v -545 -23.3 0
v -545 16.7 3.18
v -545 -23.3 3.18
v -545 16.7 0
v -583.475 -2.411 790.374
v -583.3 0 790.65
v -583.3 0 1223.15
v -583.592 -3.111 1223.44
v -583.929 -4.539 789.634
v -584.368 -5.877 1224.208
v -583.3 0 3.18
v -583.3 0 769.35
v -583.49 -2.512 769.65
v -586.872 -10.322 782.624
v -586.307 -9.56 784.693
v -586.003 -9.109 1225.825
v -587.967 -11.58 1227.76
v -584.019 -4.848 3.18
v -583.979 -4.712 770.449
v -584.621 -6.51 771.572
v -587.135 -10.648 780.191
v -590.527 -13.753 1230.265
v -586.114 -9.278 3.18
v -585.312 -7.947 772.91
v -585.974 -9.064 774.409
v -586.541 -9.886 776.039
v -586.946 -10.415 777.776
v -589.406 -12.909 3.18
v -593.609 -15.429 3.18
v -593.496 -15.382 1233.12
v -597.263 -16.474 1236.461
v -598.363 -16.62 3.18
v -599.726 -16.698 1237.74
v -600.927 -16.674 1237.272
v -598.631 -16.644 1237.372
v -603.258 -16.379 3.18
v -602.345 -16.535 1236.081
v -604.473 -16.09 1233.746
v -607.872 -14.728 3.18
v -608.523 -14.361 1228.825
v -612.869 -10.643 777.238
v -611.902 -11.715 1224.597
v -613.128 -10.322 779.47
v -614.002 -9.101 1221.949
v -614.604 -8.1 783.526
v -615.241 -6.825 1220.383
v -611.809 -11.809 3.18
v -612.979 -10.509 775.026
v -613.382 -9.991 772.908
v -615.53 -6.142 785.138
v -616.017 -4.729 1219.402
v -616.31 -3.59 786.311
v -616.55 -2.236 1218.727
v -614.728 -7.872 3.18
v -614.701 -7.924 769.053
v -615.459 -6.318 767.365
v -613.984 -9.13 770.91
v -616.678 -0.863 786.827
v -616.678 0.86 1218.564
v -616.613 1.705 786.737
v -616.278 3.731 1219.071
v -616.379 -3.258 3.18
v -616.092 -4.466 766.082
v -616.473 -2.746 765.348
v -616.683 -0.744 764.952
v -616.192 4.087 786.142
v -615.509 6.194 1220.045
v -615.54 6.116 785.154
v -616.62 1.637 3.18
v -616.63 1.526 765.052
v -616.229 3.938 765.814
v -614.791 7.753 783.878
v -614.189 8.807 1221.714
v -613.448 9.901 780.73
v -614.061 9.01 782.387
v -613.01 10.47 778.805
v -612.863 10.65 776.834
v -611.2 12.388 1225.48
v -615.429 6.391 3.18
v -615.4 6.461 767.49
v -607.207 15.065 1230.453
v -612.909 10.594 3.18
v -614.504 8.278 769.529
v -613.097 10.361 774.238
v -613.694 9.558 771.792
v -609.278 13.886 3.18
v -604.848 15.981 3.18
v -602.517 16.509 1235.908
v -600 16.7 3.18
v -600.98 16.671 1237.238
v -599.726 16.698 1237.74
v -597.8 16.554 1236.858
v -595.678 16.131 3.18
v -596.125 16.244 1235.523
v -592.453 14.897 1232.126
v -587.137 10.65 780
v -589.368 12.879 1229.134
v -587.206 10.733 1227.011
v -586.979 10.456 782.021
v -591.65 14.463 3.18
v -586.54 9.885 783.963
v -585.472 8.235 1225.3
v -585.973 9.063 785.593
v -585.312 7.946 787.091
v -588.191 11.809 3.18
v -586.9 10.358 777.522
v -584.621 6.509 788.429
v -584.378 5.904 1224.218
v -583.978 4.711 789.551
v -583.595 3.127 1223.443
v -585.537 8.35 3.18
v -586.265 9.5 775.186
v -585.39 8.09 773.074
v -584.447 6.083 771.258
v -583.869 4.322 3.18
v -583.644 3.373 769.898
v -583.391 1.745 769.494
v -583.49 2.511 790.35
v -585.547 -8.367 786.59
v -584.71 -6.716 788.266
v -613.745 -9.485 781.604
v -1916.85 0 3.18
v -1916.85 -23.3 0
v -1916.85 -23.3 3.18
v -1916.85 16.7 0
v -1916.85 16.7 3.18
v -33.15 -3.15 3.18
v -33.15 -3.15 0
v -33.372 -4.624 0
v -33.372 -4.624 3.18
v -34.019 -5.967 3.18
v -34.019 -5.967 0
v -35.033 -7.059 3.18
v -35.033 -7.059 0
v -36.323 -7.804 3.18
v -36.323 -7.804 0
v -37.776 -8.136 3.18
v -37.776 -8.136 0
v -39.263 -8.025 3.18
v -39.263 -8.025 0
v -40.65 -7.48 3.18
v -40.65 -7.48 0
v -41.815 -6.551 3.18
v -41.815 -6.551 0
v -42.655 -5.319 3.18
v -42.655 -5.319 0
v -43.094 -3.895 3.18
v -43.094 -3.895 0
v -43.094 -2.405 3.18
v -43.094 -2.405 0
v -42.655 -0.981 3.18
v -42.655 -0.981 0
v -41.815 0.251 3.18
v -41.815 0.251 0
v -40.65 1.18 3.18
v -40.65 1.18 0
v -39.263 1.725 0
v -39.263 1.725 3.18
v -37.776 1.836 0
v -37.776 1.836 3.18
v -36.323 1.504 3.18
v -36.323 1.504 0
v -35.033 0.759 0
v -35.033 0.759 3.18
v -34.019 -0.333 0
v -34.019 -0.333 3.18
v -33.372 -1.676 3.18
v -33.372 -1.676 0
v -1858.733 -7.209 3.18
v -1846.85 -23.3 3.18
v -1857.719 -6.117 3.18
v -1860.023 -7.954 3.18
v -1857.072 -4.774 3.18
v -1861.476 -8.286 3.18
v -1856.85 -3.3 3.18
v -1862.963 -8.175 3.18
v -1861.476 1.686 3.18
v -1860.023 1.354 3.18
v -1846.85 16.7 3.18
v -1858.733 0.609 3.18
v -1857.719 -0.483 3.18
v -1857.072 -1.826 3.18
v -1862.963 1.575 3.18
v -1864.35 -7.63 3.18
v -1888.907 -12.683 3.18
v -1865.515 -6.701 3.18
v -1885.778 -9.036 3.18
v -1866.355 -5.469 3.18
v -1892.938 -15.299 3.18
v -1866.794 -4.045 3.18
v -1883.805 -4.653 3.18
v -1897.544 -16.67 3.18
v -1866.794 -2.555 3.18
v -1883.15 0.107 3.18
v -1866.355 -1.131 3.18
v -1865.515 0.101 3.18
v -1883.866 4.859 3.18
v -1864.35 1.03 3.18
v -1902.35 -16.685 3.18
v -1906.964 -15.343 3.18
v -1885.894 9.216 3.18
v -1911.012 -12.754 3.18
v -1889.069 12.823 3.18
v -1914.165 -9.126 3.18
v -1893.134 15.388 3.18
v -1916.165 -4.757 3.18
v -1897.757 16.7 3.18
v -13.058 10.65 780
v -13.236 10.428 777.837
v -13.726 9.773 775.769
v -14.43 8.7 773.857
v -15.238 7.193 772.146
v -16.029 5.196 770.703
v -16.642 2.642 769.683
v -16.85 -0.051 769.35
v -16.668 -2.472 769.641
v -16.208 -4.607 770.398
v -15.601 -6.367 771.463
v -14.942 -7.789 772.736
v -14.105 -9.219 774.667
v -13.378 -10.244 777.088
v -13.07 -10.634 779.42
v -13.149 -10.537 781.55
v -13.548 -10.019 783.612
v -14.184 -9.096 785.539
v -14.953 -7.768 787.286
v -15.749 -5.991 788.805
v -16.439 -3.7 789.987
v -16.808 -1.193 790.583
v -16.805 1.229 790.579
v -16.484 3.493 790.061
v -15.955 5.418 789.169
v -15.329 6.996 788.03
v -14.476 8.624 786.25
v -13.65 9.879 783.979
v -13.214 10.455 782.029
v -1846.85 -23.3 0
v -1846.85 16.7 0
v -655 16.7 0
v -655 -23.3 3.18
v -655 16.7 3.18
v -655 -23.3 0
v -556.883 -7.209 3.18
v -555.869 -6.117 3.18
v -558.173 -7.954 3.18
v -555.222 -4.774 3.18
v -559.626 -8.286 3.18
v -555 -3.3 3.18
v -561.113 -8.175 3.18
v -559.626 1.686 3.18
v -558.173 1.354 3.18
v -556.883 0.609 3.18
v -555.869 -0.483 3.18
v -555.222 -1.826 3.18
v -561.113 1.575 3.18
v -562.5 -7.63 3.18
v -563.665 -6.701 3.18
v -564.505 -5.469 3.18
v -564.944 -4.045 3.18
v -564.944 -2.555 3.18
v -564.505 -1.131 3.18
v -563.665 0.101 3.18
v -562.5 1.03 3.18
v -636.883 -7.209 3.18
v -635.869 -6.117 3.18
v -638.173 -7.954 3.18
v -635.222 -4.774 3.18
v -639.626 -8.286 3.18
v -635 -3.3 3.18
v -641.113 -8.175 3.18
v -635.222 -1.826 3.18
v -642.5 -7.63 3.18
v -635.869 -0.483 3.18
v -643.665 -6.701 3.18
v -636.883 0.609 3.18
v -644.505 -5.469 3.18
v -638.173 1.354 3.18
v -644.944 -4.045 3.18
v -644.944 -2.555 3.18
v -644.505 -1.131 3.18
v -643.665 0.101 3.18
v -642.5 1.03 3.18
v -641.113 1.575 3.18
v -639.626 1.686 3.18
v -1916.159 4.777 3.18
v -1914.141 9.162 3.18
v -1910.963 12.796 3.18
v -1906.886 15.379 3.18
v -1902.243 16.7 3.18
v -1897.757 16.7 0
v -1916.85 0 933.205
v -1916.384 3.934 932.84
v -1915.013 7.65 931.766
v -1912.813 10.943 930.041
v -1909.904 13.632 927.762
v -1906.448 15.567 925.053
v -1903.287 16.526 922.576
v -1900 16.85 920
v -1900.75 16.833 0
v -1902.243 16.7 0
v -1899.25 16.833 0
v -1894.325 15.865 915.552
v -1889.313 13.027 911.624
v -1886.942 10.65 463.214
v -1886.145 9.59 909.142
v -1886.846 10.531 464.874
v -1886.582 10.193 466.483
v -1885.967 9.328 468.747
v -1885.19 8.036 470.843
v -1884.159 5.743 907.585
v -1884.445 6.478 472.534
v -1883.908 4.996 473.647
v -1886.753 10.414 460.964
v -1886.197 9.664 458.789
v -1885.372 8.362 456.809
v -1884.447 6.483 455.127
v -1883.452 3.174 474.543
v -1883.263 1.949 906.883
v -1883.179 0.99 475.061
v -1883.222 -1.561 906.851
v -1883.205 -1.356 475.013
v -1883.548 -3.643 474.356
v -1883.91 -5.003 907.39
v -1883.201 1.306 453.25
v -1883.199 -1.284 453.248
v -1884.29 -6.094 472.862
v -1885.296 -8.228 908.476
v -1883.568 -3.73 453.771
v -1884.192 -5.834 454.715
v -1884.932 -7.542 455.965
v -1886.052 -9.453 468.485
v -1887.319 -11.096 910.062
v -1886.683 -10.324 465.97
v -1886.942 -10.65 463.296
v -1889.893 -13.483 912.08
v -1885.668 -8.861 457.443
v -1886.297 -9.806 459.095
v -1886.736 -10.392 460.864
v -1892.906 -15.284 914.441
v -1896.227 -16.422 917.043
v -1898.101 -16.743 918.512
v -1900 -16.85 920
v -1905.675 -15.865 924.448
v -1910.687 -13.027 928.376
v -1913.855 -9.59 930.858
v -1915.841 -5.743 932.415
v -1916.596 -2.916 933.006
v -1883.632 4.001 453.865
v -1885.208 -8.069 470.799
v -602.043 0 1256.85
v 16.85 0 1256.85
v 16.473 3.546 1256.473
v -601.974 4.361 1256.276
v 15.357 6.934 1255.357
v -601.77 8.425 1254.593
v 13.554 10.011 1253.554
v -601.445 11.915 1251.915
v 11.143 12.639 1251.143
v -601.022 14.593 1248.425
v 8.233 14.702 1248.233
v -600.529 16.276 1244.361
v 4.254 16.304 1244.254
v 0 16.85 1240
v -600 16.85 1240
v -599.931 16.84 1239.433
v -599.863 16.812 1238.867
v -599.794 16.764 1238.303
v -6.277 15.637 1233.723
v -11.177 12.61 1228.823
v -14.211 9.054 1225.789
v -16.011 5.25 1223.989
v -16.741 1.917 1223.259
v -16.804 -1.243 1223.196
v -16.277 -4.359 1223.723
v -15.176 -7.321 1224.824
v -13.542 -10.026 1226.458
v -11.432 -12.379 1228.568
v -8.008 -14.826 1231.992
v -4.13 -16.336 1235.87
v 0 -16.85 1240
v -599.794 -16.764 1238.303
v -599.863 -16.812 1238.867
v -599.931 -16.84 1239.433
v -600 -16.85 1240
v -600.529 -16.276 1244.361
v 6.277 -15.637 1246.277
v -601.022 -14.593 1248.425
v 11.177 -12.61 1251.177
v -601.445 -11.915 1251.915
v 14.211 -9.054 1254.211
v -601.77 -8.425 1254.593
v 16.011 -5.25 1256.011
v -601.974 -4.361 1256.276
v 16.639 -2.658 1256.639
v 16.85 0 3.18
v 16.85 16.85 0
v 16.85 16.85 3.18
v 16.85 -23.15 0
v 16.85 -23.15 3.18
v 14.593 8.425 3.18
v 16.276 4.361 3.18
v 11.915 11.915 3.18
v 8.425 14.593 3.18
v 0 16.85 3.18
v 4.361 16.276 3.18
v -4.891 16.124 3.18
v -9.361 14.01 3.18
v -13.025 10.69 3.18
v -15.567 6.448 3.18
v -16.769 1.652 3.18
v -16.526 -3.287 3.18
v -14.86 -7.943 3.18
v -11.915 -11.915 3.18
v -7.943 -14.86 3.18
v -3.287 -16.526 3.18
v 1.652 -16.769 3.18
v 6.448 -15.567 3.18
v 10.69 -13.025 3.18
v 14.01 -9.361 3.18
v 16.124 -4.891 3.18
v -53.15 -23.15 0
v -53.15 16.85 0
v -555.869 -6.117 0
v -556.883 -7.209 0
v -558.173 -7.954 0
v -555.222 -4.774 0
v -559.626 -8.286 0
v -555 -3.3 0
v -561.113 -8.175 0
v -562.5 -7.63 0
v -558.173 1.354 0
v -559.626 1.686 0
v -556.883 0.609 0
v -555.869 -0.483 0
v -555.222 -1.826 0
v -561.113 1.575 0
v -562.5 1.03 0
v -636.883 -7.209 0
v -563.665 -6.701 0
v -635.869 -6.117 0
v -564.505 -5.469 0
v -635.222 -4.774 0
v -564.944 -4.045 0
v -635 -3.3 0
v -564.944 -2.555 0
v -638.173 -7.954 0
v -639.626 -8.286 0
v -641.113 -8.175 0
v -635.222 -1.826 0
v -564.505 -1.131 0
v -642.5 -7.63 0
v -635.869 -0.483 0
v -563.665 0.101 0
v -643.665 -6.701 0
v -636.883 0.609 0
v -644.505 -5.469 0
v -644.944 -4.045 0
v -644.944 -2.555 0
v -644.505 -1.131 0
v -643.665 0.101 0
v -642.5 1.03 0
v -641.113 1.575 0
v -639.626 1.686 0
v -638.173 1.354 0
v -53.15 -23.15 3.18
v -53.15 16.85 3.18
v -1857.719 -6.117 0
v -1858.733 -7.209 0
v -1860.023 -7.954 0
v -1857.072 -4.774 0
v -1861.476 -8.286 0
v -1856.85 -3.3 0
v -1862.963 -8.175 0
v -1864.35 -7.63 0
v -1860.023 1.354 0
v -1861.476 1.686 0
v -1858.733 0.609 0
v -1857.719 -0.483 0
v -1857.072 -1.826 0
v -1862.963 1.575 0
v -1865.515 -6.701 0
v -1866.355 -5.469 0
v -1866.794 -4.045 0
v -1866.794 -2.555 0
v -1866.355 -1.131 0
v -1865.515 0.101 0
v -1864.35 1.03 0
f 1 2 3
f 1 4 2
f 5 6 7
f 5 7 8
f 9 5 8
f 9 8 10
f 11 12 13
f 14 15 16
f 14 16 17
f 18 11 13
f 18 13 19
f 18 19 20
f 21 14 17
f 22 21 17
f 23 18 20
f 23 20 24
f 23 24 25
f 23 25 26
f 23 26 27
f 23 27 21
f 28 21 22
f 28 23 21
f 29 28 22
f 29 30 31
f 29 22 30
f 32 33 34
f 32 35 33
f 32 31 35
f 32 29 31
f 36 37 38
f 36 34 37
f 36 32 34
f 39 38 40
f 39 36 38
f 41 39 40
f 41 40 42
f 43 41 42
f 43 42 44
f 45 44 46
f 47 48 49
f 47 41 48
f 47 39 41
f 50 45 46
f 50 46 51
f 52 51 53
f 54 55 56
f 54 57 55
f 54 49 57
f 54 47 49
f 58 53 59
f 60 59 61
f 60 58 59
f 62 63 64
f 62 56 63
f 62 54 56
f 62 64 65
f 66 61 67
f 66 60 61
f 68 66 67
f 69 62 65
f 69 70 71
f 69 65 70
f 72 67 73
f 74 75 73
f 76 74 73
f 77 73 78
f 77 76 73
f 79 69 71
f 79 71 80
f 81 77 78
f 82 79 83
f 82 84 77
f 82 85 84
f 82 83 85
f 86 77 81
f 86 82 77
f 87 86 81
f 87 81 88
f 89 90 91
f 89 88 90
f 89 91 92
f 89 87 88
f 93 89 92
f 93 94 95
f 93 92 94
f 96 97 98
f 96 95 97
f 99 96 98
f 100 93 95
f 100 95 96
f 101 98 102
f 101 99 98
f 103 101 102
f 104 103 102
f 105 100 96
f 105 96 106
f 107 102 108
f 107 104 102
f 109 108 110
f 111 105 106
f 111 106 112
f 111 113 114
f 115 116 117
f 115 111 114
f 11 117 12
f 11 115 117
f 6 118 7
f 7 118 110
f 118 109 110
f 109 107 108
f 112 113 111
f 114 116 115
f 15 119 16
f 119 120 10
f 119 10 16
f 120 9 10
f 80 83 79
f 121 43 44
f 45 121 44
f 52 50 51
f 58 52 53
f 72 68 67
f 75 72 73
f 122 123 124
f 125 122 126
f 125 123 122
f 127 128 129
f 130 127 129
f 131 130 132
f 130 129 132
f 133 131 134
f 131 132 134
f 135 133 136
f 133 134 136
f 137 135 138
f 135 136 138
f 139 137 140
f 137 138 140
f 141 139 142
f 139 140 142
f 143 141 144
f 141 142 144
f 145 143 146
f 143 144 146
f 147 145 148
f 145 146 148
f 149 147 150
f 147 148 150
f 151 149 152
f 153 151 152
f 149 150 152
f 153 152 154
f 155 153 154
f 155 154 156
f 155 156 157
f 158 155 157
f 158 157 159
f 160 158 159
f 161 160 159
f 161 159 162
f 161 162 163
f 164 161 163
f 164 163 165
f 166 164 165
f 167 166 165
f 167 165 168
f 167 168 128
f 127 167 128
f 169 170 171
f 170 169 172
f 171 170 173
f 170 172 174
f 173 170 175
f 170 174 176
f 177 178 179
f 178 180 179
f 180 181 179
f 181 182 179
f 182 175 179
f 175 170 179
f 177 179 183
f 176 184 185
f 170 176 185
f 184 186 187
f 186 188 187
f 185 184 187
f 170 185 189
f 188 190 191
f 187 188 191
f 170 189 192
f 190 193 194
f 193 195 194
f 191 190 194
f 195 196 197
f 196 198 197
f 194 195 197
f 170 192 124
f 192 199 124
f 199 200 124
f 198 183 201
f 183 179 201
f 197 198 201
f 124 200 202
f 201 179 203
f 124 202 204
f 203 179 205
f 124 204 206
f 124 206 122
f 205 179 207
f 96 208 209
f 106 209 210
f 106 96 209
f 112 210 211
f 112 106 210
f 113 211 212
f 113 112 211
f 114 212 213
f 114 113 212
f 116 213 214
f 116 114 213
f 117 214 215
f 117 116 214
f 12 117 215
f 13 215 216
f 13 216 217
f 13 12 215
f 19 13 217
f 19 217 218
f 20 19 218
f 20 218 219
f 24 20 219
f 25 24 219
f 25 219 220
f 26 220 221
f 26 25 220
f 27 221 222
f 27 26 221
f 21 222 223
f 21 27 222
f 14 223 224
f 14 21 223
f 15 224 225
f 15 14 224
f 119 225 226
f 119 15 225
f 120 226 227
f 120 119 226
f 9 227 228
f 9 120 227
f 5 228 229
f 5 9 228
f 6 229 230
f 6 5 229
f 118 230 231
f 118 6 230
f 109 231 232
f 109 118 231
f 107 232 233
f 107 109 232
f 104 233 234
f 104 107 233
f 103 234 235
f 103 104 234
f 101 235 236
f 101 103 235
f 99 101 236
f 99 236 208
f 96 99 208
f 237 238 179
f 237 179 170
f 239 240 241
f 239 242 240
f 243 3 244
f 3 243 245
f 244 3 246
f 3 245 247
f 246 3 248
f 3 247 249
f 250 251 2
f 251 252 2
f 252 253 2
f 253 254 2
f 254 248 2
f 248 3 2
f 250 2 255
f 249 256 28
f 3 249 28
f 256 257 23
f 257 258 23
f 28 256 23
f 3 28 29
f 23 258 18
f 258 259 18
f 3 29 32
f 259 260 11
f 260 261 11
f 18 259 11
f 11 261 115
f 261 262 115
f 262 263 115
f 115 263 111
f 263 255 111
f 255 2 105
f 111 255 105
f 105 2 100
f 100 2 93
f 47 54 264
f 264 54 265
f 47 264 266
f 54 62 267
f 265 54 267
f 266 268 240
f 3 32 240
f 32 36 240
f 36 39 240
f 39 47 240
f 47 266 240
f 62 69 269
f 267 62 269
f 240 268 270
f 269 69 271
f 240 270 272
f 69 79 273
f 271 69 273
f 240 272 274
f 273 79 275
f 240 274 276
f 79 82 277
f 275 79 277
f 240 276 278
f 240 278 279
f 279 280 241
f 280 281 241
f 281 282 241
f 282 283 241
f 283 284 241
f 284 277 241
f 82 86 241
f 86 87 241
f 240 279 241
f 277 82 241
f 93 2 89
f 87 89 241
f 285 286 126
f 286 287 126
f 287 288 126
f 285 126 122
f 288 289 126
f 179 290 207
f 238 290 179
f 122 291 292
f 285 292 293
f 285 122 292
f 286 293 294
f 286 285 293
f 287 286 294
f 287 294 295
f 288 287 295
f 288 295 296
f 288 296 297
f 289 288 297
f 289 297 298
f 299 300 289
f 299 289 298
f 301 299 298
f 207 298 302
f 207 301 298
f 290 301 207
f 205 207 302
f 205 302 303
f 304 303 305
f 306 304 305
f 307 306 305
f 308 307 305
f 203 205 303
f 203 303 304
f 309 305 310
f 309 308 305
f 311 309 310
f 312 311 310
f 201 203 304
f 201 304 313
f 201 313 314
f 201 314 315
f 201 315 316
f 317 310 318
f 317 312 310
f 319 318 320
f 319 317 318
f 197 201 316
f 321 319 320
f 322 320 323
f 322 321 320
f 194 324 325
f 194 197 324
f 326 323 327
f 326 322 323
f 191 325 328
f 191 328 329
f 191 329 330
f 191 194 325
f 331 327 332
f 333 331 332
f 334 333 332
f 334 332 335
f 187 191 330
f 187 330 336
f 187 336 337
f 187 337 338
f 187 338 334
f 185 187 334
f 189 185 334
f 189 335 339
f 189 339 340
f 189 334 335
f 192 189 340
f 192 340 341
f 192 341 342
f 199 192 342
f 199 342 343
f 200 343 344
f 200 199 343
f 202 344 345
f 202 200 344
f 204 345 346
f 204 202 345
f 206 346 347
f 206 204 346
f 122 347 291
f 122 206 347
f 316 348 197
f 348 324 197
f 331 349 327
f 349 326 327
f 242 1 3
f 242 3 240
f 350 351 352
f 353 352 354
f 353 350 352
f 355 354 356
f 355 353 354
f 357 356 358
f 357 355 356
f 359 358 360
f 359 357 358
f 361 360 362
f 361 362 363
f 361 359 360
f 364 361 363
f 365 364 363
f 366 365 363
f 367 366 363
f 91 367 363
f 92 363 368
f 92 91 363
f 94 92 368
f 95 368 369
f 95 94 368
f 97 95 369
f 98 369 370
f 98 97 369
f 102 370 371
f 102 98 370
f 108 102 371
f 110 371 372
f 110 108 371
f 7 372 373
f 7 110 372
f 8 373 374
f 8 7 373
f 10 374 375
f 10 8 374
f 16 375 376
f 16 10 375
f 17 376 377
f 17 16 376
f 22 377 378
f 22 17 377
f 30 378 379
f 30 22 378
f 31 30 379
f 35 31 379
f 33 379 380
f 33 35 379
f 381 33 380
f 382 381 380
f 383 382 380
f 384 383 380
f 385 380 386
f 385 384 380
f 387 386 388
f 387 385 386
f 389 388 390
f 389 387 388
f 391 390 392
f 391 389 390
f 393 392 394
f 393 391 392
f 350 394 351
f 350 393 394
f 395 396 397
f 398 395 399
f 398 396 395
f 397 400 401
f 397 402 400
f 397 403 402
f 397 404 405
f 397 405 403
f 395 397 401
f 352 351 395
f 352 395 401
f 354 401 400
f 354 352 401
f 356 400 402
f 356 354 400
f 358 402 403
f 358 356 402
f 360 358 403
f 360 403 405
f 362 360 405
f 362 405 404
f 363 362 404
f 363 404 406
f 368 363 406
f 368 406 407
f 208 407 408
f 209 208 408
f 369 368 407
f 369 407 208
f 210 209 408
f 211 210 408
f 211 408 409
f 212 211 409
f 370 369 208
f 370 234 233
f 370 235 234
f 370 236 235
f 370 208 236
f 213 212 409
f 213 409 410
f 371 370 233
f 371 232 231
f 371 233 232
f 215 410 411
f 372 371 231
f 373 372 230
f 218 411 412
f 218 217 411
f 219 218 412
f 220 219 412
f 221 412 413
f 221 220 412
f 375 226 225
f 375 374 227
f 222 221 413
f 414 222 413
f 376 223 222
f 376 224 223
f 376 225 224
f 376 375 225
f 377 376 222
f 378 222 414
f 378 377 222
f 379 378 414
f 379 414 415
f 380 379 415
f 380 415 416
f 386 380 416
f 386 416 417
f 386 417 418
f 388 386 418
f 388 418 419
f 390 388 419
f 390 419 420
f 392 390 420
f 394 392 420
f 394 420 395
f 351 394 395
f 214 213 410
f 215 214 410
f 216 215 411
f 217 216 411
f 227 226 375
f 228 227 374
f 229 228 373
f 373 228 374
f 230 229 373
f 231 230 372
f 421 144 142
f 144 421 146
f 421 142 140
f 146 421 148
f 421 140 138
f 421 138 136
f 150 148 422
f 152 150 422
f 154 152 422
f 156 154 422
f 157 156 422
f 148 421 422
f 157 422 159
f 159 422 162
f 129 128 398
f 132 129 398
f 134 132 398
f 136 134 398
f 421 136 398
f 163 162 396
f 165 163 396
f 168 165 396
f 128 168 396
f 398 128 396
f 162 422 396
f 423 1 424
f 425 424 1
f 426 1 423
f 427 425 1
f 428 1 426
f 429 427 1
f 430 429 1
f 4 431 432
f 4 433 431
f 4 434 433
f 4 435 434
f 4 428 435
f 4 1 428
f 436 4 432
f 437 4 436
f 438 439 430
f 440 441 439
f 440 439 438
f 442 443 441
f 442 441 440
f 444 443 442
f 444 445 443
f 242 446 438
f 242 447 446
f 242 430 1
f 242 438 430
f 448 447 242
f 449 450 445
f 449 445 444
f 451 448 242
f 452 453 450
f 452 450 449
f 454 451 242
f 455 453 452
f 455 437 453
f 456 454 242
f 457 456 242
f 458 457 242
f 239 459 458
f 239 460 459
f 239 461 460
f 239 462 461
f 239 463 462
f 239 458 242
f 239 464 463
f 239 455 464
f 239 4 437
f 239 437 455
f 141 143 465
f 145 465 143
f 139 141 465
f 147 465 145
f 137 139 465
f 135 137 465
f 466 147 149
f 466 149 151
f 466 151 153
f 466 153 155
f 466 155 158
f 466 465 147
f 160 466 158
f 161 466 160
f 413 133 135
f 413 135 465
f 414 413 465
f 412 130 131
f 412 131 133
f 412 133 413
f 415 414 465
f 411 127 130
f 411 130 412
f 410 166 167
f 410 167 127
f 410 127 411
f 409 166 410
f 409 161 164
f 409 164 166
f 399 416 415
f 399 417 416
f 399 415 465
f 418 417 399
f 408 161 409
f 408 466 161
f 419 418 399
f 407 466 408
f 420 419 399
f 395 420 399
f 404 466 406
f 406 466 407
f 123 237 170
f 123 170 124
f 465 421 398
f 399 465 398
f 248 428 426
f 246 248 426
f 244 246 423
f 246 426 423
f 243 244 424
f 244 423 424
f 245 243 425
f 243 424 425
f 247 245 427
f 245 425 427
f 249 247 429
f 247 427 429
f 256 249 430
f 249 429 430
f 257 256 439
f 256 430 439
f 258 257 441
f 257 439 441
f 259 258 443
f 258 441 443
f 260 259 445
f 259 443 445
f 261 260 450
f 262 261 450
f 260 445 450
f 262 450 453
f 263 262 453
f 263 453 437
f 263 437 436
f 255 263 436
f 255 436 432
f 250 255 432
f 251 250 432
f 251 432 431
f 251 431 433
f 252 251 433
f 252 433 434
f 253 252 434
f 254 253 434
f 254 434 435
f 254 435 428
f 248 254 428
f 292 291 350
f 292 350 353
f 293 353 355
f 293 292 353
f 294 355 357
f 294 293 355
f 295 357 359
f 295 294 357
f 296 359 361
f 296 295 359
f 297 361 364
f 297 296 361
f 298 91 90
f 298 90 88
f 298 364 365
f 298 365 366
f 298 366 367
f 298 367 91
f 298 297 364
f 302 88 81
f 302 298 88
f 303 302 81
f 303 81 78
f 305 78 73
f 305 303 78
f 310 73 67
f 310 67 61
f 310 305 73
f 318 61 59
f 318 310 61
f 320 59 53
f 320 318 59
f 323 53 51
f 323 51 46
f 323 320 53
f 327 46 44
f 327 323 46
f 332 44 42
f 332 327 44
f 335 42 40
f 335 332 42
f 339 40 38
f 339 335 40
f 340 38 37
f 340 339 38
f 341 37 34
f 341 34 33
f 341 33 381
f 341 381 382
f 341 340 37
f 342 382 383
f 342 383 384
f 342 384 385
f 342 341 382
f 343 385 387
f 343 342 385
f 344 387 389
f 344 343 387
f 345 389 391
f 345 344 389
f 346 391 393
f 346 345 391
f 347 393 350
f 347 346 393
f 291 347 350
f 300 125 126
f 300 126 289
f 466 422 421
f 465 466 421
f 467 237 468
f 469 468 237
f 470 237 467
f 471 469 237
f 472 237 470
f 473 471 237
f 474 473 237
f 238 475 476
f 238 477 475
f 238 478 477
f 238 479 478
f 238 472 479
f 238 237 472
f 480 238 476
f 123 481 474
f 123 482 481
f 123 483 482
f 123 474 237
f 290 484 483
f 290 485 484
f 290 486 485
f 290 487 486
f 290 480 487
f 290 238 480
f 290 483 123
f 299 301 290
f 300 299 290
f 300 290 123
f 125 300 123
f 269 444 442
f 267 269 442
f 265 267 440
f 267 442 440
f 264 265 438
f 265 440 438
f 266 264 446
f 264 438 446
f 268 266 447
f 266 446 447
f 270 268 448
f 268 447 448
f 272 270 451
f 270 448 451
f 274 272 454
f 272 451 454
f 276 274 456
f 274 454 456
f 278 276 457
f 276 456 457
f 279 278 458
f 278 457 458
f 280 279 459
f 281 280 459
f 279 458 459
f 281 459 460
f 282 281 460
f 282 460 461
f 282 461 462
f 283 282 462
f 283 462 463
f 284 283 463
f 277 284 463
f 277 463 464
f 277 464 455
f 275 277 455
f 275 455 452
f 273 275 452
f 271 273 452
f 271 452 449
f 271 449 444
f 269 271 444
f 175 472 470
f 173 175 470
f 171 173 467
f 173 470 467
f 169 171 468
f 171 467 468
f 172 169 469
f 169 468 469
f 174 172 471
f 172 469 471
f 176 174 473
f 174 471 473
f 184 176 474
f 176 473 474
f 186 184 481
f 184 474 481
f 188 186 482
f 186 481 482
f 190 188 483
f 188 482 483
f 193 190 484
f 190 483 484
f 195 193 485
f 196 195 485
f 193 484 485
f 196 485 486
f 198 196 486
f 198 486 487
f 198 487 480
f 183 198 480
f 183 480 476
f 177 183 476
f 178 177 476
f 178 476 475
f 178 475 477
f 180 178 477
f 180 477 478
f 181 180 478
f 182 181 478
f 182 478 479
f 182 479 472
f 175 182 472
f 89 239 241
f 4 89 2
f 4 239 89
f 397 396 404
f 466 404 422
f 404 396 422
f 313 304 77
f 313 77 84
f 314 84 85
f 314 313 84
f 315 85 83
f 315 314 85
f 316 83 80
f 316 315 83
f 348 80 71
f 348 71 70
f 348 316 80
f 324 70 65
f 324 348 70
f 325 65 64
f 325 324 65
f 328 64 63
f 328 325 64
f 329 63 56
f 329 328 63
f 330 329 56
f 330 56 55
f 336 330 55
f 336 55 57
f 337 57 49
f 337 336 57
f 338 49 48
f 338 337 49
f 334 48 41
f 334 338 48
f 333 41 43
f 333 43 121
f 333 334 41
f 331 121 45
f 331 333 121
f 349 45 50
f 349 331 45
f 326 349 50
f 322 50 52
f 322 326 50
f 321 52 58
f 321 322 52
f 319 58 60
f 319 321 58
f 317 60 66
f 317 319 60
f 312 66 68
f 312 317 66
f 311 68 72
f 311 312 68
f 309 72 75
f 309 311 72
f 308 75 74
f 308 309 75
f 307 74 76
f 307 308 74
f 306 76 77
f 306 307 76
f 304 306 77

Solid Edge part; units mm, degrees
sketch "Sketch1" plane through (0, 0, 0) normal (0, -1, 0) x (1, 0, 0)
  line L0 (0, 0) -> (0, 1240)
  line L1 (0, 1240) -> (-600, 1240)
  line L2 (-600, 1240) -> (-1900, 920)
  line L3 (-1900, 0) -> (-1900, 920)
sketch "Sketch2" plane through (0, 0, 0) normal (0, 0, 1) x (1, 0, 0)
  circle A0 centre (0, 0) radius 16.85
sweep "SweptProtrusion_1" add profiles "Sketch2" path "Sketch1"
sketch "Sketch3" plane through (0, 0, 0) normal (0, 0, 1) x (1, 0, 0)
  line L0 (-1916.85, 16.7) -> (-1846.85, 16.7)
  line L1 (-1846.85, 16.7) -> (-1846.85, -23.3)
  line L2 (-1846.85, -23.3) -> (-1916.85, -23.3)
  line L3 (-1916.85, -23.3) -> (-1916.85, 16.7)
  line L4 (-655, 16.7) -> (-545, 16.7)
  line L5 (-545, 16.7) -> (-545, -23.3)
  line L6 (-545, -23.3) -> (-655, -23.3)
  line L7 (-655, -23.3) -> (-655, 16.7)
  line L8 (-53.15, -23.15) -> (16.85, -23.15)
  line L9 (16.85, 16.85) -> (16.85, -23.15)
  line L10 (16.85, 16.85) -> (-53.15, 16.85)
  line L11 (-53.15, 16.85) -> (-53.15, -23.15)
  dimension "D1" = 70
  dimension "D2" = 40
  dimension "D3" = 40
  dimension "D4" = 110
  dimension "D5" = 600
  dimension "D6" = 40
  dimension "D7" = 70
extrude "ExtrudedProtrusion_1" add sketch "Sketch3" along normal blind 3.18
sketch "Sketch4" plane through (0, 0, 0) normal (0, 0, 1) x (1, 0, 0)
  circle A0 centre (-600, 0) radius 16.7
extrude "Protrusion1" add sketch "Sketch4" along normal up to vertex (1240 mm away)
sketch "Sketch5" plane through (0, 0, 0) normal (0, -1, 0) x (1, 0, 0)
  line L0 (0, 780) -> (-600, 780)
  line L1 (-600, 780) -> (-1900, 460)
sketch "Sketch6" plane through (0, 0, 780) normal (1, 0, 0) x (0, 1, 0)
  circle A0 centre (0, 0) radius 10.65
sweep "SweptProtrusion_2" add profiles "Sketch6" path "Sketch5"
sketch "Sketch7" plane through (-600, -3.3, 0) normal (0, 0, -1) x (1, 0, 0)
  circle A0 centre (-40, 0) radius 5
  circle A1 centre (40, 0) radius 5
  circle A2 centre (-1261.85, 0) radius 5
  circle A3 centre (561.85, -0.15) radius 5
  dimension "D1" = 10
  dimension "D2" = 10
  dimension "D3" = 15
  dimension "D4" = 15
  dimension "D5" = 10
  dimension "D6" = 15
  dimension "D7" = 15
  dimension "D8" = 10
extrude "Cutout1" cut sketch "Sketch7" against normal up to next
